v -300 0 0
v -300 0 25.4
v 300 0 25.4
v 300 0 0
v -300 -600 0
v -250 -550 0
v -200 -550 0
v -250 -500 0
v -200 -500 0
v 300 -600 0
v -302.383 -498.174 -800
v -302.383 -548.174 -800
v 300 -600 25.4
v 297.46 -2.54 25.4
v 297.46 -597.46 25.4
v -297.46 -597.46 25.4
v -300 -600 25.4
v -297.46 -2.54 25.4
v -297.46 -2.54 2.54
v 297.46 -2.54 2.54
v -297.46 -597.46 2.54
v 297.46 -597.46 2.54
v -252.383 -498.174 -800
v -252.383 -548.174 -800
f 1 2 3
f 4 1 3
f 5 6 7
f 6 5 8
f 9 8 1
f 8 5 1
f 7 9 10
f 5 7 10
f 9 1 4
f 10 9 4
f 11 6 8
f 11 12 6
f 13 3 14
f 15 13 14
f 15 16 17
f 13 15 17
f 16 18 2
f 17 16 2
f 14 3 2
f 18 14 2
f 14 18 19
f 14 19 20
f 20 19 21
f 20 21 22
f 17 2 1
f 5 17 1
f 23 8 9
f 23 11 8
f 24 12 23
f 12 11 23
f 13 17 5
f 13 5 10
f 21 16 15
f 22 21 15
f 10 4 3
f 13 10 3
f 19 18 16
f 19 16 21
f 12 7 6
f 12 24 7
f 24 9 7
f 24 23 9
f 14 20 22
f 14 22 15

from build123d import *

# Parameters (mm, degrees)
F1_DEPTH = 600
F2_T     = -2.54
F3_W     = 50
F3_H     = 50
F5_W     = 50
F5_H     = 50


with BuildPart() as f1:
    # F0 (on Front) → F1 (new body)
    with BuildSketch(Plane.XZ):
        Polygon((300, 25.4), (-300, 25.4), (-300, 0), (-250, 0), (250, 0), (300, 0), align=None)
    extrude(amount=F1_DEPTH)

    # F2
    f2_openings = [f1.faces().sort_by_distance(p)[0] for p in [
        (0, -300, 25.4),
    ]]
    offset(amount=F2_T, openings=f2_openings)

    # F3 (on face) → F6 section 0
    with BuildSketch(Plane(origin=(0, 0, 0), x_dir=(1, 0, 0), z_dir=(0, 0, -1))):
        with Locations((-225, 525)):
            Rectangle(F3_W, F3_H)
    # F5 (on offset) → F6 section 1
    with BuildSketch(Plane.XY.offset(-800)):
        with Locations((-277.383376, -523.17366)):
            Rectangle(F5_W, F5_H)
    loft()


solid = f1.part
